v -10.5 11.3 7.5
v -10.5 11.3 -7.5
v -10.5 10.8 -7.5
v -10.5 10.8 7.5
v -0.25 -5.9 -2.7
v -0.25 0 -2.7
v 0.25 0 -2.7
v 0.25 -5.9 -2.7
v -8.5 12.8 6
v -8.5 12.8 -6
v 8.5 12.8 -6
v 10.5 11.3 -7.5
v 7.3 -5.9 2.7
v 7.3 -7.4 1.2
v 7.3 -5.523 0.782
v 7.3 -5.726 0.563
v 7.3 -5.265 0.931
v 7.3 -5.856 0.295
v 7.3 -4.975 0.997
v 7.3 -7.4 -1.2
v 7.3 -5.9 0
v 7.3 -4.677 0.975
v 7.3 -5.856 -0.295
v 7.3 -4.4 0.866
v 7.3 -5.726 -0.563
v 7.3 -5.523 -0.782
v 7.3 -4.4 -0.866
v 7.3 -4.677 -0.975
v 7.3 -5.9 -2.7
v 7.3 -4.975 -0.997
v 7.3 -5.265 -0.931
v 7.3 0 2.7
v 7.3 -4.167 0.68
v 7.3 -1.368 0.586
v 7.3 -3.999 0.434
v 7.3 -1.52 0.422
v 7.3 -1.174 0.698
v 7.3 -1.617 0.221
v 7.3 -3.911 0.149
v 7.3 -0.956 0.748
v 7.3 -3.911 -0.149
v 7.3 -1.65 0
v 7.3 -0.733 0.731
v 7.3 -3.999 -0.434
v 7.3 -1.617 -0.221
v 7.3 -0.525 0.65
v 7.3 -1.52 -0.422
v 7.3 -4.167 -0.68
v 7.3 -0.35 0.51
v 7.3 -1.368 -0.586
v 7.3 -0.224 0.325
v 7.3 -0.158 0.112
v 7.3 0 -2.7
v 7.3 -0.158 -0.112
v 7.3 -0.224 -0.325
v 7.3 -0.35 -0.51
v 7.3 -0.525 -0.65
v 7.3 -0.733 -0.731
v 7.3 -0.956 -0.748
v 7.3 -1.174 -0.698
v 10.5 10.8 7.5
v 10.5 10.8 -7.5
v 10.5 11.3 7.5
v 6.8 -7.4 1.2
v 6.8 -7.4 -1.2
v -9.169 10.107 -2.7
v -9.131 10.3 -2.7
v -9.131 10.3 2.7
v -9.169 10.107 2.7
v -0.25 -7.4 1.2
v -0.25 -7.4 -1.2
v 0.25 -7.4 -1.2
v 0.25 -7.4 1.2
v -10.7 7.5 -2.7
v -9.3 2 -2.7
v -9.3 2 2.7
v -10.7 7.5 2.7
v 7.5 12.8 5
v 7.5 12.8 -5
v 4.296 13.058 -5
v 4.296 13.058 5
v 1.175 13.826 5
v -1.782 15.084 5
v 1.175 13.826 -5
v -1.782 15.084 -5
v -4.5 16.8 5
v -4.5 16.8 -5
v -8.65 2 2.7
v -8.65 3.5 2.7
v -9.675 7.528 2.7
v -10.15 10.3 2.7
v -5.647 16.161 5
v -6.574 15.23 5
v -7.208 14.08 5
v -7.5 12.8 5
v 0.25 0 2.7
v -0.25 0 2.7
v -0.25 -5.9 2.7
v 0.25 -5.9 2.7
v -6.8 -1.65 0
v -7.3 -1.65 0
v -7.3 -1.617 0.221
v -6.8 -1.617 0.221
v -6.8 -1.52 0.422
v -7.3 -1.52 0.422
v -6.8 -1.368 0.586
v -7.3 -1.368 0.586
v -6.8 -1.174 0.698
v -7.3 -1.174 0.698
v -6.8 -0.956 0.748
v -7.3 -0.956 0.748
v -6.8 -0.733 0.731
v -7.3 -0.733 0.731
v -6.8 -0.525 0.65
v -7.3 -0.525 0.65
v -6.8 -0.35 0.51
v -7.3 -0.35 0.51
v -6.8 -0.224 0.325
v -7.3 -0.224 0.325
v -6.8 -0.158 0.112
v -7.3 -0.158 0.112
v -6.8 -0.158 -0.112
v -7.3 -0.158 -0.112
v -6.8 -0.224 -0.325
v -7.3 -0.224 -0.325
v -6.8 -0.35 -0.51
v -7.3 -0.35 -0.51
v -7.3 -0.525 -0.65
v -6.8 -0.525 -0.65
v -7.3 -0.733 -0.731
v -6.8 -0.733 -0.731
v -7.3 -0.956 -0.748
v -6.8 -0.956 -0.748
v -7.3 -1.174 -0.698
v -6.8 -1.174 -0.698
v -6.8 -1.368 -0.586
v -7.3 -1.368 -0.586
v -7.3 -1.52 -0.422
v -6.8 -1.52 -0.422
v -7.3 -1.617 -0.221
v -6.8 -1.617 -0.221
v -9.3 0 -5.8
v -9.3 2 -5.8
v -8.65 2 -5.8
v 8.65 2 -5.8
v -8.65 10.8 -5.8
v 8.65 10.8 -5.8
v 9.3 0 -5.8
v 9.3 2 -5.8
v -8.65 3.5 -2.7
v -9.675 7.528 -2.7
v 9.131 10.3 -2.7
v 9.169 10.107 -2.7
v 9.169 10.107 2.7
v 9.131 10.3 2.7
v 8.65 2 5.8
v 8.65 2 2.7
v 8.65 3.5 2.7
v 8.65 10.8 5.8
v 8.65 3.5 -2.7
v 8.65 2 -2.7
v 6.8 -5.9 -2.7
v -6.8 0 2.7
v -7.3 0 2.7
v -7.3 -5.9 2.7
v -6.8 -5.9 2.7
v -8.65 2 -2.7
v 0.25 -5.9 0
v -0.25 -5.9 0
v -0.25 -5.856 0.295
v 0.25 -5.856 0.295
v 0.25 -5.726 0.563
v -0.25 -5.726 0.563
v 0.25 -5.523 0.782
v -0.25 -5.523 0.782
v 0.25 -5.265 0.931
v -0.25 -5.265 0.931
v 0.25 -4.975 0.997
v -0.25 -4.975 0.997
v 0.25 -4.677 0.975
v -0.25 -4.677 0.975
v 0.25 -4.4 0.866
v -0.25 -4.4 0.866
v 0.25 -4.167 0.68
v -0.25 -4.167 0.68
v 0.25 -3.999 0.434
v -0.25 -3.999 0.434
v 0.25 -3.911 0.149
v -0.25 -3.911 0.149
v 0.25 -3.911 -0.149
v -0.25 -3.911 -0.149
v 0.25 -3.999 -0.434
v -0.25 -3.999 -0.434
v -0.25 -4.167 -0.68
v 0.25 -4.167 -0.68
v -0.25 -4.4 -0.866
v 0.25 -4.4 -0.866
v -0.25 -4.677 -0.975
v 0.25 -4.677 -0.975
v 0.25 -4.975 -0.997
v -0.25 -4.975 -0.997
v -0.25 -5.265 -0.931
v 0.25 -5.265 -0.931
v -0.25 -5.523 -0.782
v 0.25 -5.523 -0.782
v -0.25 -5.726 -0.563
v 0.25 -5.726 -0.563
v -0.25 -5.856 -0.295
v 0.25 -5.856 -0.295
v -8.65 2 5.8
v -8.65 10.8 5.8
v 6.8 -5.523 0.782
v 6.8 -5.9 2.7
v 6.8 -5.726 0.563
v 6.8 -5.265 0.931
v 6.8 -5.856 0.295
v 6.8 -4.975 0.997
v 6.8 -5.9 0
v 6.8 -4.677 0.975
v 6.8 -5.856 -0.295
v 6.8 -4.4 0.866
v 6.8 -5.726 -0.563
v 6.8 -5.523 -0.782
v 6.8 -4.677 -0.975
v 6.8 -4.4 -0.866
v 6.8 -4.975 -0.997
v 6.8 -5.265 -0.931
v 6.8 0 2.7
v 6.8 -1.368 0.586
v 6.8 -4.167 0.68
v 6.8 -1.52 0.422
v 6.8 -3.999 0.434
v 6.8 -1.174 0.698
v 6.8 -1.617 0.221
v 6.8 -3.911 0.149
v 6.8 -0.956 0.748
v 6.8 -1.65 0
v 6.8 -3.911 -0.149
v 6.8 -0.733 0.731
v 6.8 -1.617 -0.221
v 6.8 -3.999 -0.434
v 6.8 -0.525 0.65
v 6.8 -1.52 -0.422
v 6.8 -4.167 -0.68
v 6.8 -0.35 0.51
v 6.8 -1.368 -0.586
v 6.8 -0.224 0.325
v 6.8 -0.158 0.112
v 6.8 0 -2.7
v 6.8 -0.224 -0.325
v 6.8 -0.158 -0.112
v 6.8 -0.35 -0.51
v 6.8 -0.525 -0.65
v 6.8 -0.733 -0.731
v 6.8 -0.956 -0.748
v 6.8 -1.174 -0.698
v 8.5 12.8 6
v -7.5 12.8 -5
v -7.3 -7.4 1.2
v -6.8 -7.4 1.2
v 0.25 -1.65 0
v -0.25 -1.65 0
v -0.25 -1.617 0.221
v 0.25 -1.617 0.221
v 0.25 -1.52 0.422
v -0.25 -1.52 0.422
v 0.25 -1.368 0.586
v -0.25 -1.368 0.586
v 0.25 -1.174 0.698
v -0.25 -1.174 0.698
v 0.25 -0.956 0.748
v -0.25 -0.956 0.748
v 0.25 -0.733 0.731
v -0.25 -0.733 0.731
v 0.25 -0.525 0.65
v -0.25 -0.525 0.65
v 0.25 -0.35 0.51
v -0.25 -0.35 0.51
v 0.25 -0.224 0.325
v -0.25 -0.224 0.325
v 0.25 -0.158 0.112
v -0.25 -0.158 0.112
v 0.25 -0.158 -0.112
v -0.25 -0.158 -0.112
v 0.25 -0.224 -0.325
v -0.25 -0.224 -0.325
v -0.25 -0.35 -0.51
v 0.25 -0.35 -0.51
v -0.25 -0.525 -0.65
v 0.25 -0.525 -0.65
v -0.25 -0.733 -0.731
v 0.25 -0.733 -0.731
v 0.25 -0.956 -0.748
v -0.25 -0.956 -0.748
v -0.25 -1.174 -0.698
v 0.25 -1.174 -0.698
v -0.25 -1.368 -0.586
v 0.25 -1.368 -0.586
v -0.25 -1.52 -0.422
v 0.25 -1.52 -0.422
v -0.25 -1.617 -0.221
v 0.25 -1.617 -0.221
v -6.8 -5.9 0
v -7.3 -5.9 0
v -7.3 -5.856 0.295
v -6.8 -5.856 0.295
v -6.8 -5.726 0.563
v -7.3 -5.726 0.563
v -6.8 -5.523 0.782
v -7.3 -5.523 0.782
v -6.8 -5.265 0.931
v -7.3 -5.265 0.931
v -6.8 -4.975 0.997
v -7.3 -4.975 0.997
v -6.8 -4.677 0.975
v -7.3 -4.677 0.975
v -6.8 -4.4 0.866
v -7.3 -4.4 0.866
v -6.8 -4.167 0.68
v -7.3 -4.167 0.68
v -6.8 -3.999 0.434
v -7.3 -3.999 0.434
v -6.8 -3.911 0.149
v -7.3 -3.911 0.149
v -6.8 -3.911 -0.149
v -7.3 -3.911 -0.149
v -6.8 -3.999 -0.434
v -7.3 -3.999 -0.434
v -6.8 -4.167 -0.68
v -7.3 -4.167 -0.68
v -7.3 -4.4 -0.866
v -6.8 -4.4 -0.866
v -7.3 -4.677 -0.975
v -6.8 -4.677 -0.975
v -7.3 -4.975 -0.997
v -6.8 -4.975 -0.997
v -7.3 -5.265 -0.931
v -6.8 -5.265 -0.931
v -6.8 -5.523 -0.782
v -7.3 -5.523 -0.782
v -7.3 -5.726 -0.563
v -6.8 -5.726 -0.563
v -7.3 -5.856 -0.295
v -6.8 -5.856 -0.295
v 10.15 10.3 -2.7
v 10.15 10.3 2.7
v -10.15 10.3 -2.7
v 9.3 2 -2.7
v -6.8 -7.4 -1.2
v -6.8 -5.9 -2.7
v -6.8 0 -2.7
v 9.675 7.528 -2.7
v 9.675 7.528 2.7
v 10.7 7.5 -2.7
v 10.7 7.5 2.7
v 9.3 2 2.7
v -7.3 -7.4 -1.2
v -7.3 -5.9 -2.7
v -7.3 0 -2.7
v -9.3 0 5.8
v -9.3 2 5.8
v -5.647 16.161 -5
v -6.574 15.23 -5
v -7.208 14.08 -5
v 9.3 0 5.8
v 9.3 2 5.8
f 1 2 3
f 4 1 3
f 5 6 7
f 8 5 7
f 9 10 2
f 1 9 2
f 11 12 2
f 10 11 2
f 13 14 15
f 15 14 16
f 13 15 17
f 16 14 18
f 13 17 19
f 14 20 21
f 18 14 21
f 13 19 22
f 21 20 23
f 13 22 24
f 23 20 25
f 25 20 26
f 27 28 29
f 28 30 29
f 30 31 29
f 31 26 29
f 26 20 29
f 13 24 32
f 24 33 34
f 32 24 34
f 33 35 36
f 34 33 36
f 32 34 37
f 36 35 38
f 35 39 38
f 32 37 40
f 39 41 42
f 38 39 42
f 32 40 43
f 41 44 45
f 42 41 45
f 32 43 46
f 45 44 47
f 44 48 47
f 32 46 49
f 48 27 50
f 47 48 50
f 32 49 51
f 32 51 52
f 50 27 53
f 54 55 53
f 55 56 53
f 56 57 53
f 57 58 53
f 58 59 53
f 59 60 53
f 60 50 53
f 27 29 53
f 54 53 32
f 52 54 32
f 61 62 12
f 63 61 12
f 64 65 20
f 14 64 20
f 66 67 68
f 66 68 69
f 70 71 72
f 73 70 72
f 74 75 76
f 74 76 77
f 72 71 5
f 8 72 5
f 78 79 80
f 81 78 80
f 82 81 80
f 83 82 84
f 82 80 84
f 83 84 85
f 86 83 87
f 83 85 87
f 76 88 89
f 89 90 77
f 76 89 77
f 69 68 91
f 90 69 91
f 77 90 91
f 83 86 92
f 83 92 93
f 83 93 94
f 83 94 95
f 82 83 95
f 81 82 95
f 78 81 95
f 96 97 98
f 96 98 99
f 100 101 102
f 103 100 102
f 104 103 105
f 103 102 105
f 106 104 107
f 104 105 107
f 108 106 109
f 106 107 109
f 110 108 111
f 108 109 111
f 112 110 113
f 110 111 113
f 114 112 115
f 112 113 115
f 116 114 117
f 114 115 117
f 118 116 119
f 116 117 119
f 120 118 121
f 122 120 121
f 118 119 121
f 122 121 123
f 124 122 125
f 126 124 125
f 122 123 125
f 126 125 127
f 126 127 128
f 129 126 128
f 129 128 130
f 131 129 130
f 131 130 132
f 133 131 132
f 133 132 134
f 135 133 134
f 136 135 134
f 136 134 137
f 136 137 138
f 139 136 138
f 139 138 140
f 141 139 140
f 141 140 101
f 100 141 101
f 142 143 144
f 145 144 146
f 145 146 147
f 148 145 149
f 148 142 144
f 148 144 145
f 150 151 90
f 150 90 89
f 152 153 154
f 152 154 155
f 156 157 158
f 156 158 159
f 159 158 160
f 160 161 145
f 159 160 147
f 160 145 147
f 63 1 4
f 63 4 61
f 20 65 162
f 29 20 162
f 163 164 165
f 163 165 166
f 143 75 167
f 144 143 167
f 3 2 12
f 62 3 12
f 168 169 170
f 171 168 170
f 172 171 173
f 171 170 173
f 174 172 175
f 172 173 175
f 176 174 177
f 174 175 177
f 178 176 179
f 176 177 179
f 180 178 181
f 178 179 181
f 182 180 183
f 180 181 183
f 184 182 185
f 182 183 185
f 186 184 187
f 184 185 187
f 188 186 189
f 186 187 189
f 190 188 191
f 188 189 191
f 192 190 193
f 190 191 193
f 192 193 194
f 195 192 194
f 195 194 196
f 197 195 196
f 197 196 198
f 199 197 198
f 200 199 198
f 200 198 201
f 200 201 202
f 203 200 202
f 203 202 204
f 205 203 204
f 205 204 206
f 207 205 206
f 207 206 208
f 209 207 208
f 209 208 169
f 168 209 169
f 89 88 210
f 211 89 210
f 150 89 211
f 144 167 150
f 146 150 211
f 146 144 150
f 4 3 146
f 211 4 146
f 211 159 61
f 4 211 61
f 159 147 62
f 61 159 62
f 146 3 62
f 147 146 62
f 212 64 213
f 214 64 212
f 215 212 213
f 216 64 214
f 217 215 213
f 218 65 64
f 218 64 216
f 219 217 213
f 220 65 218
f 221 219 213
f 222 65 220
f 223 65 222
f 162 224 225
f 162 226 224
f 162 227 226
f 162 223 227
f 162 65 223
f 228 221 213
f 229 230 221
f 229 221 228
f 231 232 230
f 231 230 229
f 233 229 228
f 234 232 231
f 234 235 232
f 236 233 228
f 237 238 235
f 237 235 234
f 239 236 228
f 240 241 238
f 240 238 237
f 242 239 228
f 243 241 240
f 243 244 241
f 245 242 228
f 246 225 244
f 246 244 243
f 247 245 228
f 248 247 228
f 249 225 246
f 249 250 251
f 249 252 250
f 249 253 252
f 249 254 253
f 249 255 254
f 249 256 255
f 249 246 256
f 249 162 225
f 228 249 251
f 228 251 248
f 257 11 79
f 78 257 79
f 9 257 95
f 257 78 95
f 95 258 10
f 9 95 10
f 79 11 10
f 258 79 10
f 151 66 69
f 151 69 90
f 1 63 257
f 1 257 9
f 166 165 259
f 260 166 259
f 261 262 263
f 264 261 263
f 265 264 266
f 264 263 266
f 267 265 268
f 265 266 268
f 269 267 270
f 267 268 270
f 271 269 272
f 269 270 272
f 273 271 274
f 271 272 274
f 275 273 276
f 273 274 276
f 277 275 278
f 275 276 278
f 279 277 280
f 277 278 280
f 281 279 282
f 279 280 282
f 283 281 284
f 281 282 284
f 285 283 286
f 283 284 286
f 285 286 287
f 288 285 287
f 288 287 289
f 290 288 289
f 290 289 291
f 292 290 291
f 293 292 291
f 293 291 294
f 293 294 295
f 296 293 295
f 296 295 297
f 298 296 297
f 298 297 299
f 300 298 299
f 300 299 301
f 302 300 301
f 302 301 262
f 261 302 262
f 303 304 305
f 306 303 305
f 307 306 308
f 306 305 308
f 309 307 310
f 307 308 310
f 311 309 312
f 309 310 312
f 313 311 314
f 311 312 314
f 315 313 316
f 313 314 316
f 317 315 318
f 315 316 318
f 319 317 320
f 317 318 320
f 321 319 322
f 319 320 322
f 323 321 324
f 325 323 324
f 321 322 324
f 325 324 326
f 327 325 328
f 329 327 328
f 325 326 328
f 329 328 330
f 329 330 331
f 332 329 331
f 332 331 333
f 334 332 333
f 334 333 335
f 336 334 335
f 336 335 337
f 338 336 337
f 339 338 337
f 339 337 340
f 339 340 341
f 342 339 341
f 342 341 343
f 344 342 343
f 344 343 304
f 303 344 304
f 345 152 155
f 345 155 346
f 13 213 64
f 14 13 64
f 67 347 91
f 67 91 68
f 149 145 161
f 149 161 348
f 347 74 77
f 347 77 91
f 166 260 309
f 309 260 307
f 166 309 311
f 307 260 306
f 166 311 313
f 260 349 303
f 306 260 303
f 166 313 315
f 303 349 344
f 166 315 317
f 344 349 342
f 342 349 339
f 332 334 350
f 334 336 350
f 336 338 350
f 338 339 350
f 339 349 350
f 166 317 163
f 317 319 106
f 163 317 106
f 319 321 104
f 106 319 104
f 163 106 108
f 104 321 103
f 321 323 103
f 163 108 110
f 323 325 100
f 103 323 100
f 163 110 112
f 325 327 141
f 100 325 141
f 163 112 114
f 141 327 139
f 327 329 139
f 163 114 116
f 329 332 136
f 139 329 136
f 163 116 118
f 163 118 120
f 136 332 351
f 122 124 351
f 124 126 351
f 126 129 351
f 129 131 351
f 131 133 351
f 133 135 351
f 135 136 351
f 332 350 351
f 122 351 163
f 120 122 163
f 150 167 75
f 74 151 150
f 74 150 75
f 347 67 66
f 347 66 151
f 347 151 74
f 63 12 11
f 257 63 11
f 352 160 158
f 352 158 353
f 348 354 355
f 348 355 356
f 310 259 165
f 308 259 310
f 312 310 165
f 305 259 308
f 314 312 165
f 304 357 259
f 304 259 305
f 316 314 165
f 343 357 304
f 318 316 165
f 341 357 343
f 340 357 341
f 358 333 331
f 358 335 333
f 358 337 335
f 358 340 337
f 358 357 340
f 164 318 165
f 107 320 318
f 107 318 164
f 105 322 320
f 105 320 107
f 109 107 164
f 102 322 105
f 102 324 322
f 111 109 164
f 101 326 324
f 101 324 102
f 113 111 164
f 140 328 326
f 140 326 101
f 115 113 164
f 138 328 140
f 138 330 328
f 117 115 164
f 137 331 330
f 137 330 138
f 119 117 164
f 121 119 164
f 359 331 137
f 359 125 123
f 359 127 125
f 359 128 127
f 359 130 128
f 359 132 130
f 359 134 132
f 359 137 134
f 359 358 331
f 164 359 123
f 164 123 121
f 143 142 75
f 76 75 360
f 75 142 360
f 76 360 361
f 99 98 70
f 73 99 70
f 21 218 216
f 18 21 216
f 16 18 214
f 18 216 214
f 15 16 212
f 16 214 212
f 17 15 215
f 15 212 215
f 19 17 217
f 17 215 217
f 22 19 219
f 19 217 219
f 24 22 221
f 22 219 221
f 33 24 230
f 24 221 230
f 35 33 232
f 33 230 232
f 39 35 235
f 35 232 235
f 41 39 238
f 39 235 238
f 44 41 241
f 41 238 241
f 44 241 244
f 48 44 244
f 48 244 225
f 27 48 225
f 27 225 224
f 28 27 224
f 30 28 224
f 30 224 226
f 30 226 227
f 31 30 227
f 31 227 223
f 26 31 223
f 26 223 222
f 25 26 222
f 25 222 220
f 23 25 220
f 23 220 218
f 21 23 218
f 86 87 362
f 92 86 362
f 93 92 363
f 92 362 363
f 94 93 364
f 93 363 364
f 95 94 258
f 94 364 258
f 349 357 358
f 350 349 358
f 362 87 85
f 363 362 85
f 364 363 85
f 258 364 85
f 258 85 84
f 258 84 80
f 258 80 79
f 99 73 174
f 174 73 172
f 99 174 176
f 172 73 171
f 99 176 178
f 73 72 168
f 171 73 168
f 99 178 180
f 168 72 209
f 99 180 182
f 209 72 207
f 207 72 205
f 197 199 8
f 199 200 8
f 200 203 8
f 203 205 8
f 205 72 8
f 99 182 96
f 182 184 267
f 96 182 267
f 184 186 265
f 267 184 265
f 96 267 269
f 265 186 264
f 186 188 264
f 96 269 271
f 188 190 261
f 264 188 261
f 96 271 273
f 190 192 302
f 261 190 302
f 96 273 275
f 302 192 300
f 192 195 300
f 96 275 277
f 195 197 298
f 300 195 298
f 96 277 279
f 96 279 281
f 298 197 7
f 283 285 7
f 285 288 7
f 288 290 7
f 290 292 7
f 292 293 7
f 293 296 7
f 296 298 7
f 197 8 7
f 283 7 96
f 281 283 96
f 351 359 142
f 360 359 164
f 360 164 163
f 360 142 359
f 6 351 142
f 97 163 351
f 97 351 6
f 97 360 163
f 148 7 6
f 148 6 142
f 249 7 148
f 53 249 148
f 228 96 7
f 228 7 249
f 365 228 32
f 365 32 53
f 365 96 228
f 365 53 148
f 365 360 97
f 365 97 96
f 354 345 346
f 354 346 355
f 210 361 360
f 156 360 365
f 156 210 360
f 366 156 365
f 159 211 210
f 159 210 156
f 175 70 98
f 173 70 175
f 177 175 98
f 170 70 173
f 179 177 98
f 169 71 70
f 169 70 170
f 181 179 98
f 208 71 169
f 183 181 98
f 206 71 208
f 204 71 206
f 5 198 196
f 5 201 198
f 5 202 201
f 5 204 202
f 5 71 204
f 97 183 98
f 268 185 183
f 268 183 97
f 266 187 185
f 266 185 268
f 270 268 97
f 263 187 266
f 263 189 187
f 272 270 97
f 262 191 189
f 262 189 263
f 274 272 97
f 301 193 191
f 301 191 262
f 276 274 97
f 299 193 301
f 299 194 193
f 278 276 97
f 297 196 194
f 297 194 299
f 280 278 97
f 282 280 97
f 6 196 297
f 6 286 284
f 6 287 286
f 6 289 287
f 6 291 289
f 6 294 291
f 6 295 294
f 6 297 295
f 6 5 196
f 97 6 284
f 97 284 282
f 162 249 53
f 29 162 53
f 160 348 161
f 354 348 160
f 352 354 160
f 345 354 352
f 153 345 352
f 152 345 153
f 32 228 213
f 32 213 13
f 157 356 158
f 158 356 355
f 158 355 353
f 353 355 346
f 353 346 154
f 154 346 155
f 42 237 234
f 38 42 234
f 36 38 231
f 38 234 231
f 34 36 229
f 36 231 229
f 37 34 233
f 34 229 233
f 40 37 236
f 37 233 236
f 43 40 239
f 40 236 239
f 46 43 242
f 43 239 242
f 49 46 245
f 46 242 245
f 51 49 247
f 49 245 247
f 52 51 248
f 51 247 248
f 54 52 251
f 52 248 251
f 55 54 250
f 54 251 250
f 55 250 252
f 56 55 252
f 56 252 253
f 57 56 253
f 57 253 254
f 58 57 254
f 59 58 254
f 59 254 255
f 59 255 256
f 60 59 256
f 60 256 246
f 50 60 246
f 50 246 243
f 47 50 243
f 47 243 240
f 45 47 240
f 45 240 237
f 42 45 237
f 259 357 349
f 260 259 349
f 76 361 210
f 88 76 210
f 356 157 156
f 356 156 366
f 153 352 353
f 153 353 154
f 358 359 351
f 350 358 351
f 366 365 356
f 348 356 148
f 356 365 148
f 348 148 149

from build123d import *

# Parameters (mm, degrees)
EXTRUDE_1_DEPTH             = 5.8
EXTRUDE_1_DEPTH_BACK        = 5.8
SKETCH_1_W                  = 17.3
SKETCH_1_H                  = 10.8
EXTRUDE_2_DEPTH             = 7.5
EXTRUDE_2_DEPTH_BACK        = 7.5
CHAMFER_1_SIZE              = 1.5
EXTRUDE_3_DEPTH             = 5
EXTRUDE_3_DEPTH_BACK        = 5
EXTRUDE_4_REACH             = 23.183
SKETCH_4_W                  = 18.6
SKETCH_4_H                  = 2
EXTRUDE_4_DIRECTION_2_REACH = 23.183
EXTRUDE_5_DEPTH             = 2.7
EXTRUDE_5_DEPTH_BACK        = 2.7
SKETCH_5_W                  = 0.5
SKETCH_5_H                  = 7.4
SKETCH_6_R                  = 1
SKETCH_6_R_2                = 0.75
CUT_EXTRUDE_1_DEPTH         = 26.738881095


with BuildPart() as part:
    # 草图1 → 凸台-拉伸1 (new, two sides: drawn at the far end of the back side and taken through both)
    with BuildSketch(Plane.XY.offset(-EXTRUDE_1_DEPTH_BACK)):
        with Locations((0, 5.4)):
            Rectangle(SKETCH_1_W, SKETCH_1_H)
    extrude(amount=EXTRUDE_1_DEPTH + EXTRUDE_1_DEPTH_BACK)

    # 草图2 → 凸台-拉伸2 (add, two sides: drawn at the far end of the back side and taken through both)
    with BuildSketch(Plane.XY.offset(-EXTRUDE_2_DEPTH_BACK)):
        Polygon((-8.5, 12.8), (-10.5, 11.3), (-10.5, 10.8), (10.5, 10.8), (10.5, 11.3), (8.5, 12.8), align=None)
    extrude(amount=EXTRUDE_2_DEPTH + EXTRUDE_2_DEPTH_BACK)

    # 倒角1
    chamfer_1_edges = [part.edges().sort_by_distance(p)[0] for p in [
        (0, 12.8, -7.5),
        (0, 12.8, 7.5),
    ]]
    chamfer(chamfer_1_edges, length=CHAMFER_1_SIZE)

    # 草图3 → 凸台-拉伸3 (add, two sides: drawn at the far end of the back side and taken through both)
    with BuildSketch(Plane.XY.offset(-EXTRUDE_3_DEPTH_BACK)):
        with BuildLine():
            ThreePointArc((-4.5, 16.8), (-6.57373706, 15.230302795), (-7.5, 12.8))
            Line((-7.5, 12.8), (7.5, 12.8))
            ThreePointArc((7.5, 12.8), (1.17544468, 13.826334039), (-4.5, 16.8))
        make_face()
    extrude(amount=EXTRUDE_3_DEPTH + EXTRUDE_3_DEPTH_BACK)

    # 凸台-拉伸4: up to this face of the body (flat: up to its plane)
    extrude_4_end = Plane(part.part.faces().sort_by_distance((0, 5.4, 5.8))[0])
    # 草图4 → 凸台-拉伸4 (add, up to the picked face)
    with BuildSketch(Plane.XY, mode=Mode.PRIVATE) as extrude_4_sk1:
        with Locations((0, 1)):
            Rectangle(SKETCH_4_W, SKETCH_4_H)
    extrude_4_tool1 = split(extrude(extrude_4_sk1.sketch, amount=EXTRUDE_4_REACH, mode=Mode.PRIVATE), bisect_by=extrude_4_end, keep=Keep.BOTH, mode=Mode.PRIVATE)
    add(extrude_4_tool1.solids().sort_by(Axis((0, 1, 0), (0, 0, 1)))[0])

    # 凸台-拉伸4 direction 2: up to this face of the body (flat: up to its plane)
    extrude_4_direction_2_end = Plane(part.part.faces().sort_by_distance((0, 5.4, -5.8))[0])
    # 草图4 → 凸台-拉伸4 direction 2 (add, up to the picked face)
    with BuildSketch(Plane.XY, mode=Mode.PRIVATE) as extrude_4_direction_2_sk1:
        with Locations((0, 1)):
            Rectangle(SKETCH_4_W, SKETCH_4_H)
    extrude_4_direction_2_tool1 = split(extrude(extrude_4_direction_2_sk1.sketch, amount=-EXTRUDE_4_DIRECTION_2_REACH, mode=Mode.PRIVATE), bisect_by=extrude_4_direction_2_end, keep=Keep.BOTH, mode=Mode.PRIVATE)
    add(extrude_4_direction_2_tool1.solids().sort_by(Axis((0, 1, 0), (0, 0, -1)))[0])

    # 草图5 → 凸台-拉伸5 (add, two sides: drawn at the far end of the back side and taken through both)
    with BuildSketch(Plane.XY.offset(-EXTRUDE_5_DEPTH_BACK)):
        Polygon((-9.3, 2), (-10.7, 7.5), (-10.15, 10.3), (-9.130890495, 10.3), (-9.168751179, 10.107254696), (-9.675324513, 7.528335908), (-8.65, 3.500275321), (-8.65, 2), align=None)
        Polygon((8.65, 2), (8.65, 3.500275321), (9.675324513, 7.528335908), (9.168751179, 10.107254696), (9.130890495, 10.3), (10.15, 10.3), (10.7, 7.5), (9.3, 2), align=None)
        with Locations((0, -3.7)):
            Rectangle(SKETCH_5_W, SKETCH_5_H)
        with Locations((-7.05, -3.7)):
            Rectangle(SKETCH_5_W, SKETCH_5_H)
        with Locations((7.05, -3.7)):
            Rectangle(SKETCH_5_W, SKETCH_5_H)
    extrude(amount=EXTRUDE_5_DEPTH + EXTRUDE_5_DEPTH_BACK)

    # 草图6 → 切除-拉伸1 (cut, through all)
    with BuildSketch(Plane.ZY.offset(7.3)):
        Polygon((2.7, -5.9), (1.2, -7.4), (2.7, -7.4), align=None)
        Polygon((-1.2, -7.4), (-2.7, -5.9), (-2.7, -7.4), align=None)
        with Locations((0, -4.9)):
            Circle(SKETCH_6_R)
        with Locations((0, -0.9)):
            Circle(SKETCH_6_R_2)
    extrude(amount=-CUT_EXTRUDE_1_DEPTH, mode=Mode.SUBTRACT)


solid = part.part
